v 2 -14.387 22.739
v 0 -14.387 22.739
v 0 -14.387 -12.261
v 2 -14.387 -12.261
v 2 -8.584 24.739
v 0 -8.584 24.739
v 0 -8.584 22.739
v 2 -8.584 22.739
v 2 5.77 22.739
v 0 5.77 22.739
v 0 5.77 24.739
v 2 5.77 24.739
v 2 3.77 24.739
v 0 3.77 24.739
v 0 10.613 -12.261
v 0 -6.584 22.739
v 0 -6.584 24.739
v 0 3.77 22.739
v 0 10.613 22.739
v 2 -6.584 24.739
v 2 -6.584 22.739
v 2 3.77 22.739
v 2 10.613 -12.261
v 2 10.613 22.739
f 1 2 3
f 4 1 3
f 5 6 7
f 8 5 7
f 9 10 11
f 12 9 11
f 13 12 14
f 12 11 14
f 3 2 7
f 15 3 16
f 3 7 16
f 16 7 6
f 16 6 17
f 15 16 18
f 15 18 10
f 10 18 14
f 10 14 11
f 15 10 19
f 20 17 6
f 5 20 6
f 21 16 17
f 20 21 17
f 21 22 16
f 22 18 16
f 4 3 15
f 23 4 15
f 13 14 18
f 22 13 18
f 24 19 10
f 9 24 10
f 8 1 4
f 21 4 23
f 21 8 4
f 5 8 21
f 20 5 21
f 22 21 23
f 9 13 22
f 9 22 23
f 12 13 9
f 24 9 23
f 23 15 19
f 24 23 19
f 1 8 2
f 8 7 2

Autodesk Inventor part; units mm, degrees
ref_plane "YZ Plane" through (0, 0, 0) normal (1, 0, 0) x (0, 1, 0)
ref_plane "XZ Plane" through (0, 0, 0) normal (0, 1, 0) x (-1, 0, 0)
ref_plane "XY Plane" through (0, 0, 0) normal (0, 0, 1) x (1, 0, 0)
sketch "Sketch1" plane through (0, 0, 0) normal (1, 0, 0) x (0, 1, 0)
  line L0 (10.6126, 22.7394) -> (-14.3874, 22.7394)
  line L1 (-14.3874, 22.7394) -> (-14.3874, -12.2606)
  line L2 (-14.3874, -12.2606) -> (10.6126, -12.2606)
  line L3 (10.6126, -12.2606) -> (10.6126, 22.7394)
  line L4 (5.7696, 24.7394) -> (3.7696, 24.7394)
  line L5 (3.7696, 24.7394) -> (3.7696, 22.7394)
  line L6 (3.7696, 22.7394) -> (5.7696, 22.7394)
  line L7 (5.7696, 22.7394) -> (5.7696, 24.7394)
  line L8 (-6.5839, 24.7394) -> (-8.5839, 24.7394)
  line L9 (-8.5839, 24.7394) -> (-8.5839, 22.7394)
  line L10 (-8.5839, 22.7394) -> (-6.5839, 22.7394)
  line L11 (-6.5839, 22.7394) -> (-6.5839, 24.7394)
  line L12 (3.7696, 22.7394) -> (-6.5839, 22.7394)
  point P0 (0, 0)
  dimension "d0" = 25
  dimension "d1" = 35
  dimension "d2" = 2
  dimension "d3" = 2
  dimension "d4" = 2
  dimension "d5" = 2
extrude "Extrusion1" add sketch "Sketch1" along normal blind 2
properties part number "sidestandforservoclamp"
